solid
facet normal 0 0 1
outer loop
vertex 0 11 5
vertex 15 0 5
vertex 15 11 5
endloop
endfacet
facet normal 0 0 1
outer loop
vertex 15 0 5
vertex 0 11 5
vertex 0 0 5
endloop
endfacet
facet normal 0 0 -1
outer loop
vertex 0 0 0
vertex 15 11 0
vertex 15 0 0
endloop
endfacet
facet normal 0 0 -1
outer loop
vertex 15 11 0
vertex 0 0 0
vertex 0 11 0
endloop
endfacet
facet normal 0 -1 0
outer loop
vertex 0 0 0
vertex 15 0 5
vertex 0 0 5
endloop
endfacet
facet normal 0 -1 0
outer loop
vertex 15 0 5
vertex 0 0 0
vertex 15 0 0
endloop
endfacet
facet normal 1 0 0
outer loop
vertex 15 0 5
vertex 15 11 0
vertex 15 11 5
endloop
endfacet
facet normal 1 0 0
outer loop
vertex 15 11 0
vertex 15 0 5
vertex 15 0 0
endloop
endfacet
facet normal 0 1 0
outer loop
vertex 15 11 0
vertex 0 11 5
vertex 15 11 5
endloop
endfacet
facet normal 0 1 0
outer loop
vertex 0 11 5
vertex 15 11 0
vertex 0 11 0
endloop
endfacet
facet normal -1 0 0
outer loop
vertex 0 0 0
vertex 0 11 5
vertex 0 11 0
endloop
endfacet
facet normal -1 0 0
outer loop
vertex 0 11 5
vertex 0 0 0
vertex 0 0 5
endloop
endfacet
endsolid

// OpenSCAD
// Generated by SolidPython 1.0.1 on 2020-07-29 00:46:55


cube(size = [15, 11, 5]);
/***********************************************
*********      SolidPython code:      **********
************************************************
 
# import packages: SolidPython
from solid import *
from solid.utils import *
from itertools import chain, combinations, permutations


class Resize:

    def __init__(self, scad_file):
        self.scad_file = scad_file
        #self.scad_file = import_scad(scad_file)
        # cone/cylinder param:
        self.r1 = 0
        self.r2 = 0
        self.h = 0
        # rectangular prism param:
        self.w = 0
        self.l = 0
        # ellipse param:
        self.r = 0

    # import OpenScad code (file name corresponds to shape)


    # classify shape + parameters
    def assign(self, param1, param2, param3):
        if self.scad_file == 'cone.scad':
            self.r1 = param1
            self.r2 = param2
            self.h = param3
        elif self.scad_file == 'cylinder.scad':
            self.r1 = param1
            self.r2 = param2
            self.h = param3
        elif self.scad_file == 'rectangularPrism.scad':
            self.h = param1
            self.l = param2
            self.w = param3
        else:
            self.r = param1
            self.h = param2

    # resize parameters
    def iterate(self):
        x = range(3, 20, 2)
        i = 1
        if self.scad_file == 'cone.scad':
            tempList = list(permutations(x, 2))
            for temp in tempList:
                param1 = temp[0]
                param2 = temp[1]
                filepath = 'produced_scad_files/' + 'cone' + str(param1) + '_' + str(param2) + '_' + '.scad'
                scad_render_to_file(cylinder(h=param1, r1=param2, r2=0), filepath)

        elif self.scad_file == 'cylinder.scad':
            tempList = list(permutations(x, 3))
            for temp in tempList:
                param1 = temp[0]
                param2 = temp[1]
                filepath = 'produced_scad_files/' + 'cylinder' + str(param1) + '_' + str(param2) + '_' + '.scad'
                scad_render_to_file(cylinder(h=param1, r1=param2, r2=param2), filepath)

        elif self.scad_file == 'rectangularPrism.scad':
            tempList = list(permutations(x, 3))
            for temp in tempList:
                param1 = temp[0]
                param2 = temp[1]
                param3 = temp[2]
                filepath = 'produced_scad_files/' + 'rectangularPrism' + str(param1) + '_' + str(param2) + '_' + str(
                    param3) + '.scad'
                scad_render_to_file(cube(size=(param1, param2, param3)), filepath)

        elif self.scad_file == 'ellipse.scad':
            tempList = list(permutations(x, 4))
            for temp in tempList:
                param1 = temp[0]
                param2 = temp[1]
                param3 = temp[2]
                param4 = temp[3]
                filepath = 'produced_scad_files/' + 'ellipse' + str(param1) + '_' + str(param2) + '_' + str(param3) + '_' + str(param4) + '.scad'
                scad_render_to_file(scale([param1, param2, param3])(sphere(r=param4)), filepath)

    def render_to_scadfile(self):
        scad_render_to_file(scad, 'example.scad') 
 
************************************************/
